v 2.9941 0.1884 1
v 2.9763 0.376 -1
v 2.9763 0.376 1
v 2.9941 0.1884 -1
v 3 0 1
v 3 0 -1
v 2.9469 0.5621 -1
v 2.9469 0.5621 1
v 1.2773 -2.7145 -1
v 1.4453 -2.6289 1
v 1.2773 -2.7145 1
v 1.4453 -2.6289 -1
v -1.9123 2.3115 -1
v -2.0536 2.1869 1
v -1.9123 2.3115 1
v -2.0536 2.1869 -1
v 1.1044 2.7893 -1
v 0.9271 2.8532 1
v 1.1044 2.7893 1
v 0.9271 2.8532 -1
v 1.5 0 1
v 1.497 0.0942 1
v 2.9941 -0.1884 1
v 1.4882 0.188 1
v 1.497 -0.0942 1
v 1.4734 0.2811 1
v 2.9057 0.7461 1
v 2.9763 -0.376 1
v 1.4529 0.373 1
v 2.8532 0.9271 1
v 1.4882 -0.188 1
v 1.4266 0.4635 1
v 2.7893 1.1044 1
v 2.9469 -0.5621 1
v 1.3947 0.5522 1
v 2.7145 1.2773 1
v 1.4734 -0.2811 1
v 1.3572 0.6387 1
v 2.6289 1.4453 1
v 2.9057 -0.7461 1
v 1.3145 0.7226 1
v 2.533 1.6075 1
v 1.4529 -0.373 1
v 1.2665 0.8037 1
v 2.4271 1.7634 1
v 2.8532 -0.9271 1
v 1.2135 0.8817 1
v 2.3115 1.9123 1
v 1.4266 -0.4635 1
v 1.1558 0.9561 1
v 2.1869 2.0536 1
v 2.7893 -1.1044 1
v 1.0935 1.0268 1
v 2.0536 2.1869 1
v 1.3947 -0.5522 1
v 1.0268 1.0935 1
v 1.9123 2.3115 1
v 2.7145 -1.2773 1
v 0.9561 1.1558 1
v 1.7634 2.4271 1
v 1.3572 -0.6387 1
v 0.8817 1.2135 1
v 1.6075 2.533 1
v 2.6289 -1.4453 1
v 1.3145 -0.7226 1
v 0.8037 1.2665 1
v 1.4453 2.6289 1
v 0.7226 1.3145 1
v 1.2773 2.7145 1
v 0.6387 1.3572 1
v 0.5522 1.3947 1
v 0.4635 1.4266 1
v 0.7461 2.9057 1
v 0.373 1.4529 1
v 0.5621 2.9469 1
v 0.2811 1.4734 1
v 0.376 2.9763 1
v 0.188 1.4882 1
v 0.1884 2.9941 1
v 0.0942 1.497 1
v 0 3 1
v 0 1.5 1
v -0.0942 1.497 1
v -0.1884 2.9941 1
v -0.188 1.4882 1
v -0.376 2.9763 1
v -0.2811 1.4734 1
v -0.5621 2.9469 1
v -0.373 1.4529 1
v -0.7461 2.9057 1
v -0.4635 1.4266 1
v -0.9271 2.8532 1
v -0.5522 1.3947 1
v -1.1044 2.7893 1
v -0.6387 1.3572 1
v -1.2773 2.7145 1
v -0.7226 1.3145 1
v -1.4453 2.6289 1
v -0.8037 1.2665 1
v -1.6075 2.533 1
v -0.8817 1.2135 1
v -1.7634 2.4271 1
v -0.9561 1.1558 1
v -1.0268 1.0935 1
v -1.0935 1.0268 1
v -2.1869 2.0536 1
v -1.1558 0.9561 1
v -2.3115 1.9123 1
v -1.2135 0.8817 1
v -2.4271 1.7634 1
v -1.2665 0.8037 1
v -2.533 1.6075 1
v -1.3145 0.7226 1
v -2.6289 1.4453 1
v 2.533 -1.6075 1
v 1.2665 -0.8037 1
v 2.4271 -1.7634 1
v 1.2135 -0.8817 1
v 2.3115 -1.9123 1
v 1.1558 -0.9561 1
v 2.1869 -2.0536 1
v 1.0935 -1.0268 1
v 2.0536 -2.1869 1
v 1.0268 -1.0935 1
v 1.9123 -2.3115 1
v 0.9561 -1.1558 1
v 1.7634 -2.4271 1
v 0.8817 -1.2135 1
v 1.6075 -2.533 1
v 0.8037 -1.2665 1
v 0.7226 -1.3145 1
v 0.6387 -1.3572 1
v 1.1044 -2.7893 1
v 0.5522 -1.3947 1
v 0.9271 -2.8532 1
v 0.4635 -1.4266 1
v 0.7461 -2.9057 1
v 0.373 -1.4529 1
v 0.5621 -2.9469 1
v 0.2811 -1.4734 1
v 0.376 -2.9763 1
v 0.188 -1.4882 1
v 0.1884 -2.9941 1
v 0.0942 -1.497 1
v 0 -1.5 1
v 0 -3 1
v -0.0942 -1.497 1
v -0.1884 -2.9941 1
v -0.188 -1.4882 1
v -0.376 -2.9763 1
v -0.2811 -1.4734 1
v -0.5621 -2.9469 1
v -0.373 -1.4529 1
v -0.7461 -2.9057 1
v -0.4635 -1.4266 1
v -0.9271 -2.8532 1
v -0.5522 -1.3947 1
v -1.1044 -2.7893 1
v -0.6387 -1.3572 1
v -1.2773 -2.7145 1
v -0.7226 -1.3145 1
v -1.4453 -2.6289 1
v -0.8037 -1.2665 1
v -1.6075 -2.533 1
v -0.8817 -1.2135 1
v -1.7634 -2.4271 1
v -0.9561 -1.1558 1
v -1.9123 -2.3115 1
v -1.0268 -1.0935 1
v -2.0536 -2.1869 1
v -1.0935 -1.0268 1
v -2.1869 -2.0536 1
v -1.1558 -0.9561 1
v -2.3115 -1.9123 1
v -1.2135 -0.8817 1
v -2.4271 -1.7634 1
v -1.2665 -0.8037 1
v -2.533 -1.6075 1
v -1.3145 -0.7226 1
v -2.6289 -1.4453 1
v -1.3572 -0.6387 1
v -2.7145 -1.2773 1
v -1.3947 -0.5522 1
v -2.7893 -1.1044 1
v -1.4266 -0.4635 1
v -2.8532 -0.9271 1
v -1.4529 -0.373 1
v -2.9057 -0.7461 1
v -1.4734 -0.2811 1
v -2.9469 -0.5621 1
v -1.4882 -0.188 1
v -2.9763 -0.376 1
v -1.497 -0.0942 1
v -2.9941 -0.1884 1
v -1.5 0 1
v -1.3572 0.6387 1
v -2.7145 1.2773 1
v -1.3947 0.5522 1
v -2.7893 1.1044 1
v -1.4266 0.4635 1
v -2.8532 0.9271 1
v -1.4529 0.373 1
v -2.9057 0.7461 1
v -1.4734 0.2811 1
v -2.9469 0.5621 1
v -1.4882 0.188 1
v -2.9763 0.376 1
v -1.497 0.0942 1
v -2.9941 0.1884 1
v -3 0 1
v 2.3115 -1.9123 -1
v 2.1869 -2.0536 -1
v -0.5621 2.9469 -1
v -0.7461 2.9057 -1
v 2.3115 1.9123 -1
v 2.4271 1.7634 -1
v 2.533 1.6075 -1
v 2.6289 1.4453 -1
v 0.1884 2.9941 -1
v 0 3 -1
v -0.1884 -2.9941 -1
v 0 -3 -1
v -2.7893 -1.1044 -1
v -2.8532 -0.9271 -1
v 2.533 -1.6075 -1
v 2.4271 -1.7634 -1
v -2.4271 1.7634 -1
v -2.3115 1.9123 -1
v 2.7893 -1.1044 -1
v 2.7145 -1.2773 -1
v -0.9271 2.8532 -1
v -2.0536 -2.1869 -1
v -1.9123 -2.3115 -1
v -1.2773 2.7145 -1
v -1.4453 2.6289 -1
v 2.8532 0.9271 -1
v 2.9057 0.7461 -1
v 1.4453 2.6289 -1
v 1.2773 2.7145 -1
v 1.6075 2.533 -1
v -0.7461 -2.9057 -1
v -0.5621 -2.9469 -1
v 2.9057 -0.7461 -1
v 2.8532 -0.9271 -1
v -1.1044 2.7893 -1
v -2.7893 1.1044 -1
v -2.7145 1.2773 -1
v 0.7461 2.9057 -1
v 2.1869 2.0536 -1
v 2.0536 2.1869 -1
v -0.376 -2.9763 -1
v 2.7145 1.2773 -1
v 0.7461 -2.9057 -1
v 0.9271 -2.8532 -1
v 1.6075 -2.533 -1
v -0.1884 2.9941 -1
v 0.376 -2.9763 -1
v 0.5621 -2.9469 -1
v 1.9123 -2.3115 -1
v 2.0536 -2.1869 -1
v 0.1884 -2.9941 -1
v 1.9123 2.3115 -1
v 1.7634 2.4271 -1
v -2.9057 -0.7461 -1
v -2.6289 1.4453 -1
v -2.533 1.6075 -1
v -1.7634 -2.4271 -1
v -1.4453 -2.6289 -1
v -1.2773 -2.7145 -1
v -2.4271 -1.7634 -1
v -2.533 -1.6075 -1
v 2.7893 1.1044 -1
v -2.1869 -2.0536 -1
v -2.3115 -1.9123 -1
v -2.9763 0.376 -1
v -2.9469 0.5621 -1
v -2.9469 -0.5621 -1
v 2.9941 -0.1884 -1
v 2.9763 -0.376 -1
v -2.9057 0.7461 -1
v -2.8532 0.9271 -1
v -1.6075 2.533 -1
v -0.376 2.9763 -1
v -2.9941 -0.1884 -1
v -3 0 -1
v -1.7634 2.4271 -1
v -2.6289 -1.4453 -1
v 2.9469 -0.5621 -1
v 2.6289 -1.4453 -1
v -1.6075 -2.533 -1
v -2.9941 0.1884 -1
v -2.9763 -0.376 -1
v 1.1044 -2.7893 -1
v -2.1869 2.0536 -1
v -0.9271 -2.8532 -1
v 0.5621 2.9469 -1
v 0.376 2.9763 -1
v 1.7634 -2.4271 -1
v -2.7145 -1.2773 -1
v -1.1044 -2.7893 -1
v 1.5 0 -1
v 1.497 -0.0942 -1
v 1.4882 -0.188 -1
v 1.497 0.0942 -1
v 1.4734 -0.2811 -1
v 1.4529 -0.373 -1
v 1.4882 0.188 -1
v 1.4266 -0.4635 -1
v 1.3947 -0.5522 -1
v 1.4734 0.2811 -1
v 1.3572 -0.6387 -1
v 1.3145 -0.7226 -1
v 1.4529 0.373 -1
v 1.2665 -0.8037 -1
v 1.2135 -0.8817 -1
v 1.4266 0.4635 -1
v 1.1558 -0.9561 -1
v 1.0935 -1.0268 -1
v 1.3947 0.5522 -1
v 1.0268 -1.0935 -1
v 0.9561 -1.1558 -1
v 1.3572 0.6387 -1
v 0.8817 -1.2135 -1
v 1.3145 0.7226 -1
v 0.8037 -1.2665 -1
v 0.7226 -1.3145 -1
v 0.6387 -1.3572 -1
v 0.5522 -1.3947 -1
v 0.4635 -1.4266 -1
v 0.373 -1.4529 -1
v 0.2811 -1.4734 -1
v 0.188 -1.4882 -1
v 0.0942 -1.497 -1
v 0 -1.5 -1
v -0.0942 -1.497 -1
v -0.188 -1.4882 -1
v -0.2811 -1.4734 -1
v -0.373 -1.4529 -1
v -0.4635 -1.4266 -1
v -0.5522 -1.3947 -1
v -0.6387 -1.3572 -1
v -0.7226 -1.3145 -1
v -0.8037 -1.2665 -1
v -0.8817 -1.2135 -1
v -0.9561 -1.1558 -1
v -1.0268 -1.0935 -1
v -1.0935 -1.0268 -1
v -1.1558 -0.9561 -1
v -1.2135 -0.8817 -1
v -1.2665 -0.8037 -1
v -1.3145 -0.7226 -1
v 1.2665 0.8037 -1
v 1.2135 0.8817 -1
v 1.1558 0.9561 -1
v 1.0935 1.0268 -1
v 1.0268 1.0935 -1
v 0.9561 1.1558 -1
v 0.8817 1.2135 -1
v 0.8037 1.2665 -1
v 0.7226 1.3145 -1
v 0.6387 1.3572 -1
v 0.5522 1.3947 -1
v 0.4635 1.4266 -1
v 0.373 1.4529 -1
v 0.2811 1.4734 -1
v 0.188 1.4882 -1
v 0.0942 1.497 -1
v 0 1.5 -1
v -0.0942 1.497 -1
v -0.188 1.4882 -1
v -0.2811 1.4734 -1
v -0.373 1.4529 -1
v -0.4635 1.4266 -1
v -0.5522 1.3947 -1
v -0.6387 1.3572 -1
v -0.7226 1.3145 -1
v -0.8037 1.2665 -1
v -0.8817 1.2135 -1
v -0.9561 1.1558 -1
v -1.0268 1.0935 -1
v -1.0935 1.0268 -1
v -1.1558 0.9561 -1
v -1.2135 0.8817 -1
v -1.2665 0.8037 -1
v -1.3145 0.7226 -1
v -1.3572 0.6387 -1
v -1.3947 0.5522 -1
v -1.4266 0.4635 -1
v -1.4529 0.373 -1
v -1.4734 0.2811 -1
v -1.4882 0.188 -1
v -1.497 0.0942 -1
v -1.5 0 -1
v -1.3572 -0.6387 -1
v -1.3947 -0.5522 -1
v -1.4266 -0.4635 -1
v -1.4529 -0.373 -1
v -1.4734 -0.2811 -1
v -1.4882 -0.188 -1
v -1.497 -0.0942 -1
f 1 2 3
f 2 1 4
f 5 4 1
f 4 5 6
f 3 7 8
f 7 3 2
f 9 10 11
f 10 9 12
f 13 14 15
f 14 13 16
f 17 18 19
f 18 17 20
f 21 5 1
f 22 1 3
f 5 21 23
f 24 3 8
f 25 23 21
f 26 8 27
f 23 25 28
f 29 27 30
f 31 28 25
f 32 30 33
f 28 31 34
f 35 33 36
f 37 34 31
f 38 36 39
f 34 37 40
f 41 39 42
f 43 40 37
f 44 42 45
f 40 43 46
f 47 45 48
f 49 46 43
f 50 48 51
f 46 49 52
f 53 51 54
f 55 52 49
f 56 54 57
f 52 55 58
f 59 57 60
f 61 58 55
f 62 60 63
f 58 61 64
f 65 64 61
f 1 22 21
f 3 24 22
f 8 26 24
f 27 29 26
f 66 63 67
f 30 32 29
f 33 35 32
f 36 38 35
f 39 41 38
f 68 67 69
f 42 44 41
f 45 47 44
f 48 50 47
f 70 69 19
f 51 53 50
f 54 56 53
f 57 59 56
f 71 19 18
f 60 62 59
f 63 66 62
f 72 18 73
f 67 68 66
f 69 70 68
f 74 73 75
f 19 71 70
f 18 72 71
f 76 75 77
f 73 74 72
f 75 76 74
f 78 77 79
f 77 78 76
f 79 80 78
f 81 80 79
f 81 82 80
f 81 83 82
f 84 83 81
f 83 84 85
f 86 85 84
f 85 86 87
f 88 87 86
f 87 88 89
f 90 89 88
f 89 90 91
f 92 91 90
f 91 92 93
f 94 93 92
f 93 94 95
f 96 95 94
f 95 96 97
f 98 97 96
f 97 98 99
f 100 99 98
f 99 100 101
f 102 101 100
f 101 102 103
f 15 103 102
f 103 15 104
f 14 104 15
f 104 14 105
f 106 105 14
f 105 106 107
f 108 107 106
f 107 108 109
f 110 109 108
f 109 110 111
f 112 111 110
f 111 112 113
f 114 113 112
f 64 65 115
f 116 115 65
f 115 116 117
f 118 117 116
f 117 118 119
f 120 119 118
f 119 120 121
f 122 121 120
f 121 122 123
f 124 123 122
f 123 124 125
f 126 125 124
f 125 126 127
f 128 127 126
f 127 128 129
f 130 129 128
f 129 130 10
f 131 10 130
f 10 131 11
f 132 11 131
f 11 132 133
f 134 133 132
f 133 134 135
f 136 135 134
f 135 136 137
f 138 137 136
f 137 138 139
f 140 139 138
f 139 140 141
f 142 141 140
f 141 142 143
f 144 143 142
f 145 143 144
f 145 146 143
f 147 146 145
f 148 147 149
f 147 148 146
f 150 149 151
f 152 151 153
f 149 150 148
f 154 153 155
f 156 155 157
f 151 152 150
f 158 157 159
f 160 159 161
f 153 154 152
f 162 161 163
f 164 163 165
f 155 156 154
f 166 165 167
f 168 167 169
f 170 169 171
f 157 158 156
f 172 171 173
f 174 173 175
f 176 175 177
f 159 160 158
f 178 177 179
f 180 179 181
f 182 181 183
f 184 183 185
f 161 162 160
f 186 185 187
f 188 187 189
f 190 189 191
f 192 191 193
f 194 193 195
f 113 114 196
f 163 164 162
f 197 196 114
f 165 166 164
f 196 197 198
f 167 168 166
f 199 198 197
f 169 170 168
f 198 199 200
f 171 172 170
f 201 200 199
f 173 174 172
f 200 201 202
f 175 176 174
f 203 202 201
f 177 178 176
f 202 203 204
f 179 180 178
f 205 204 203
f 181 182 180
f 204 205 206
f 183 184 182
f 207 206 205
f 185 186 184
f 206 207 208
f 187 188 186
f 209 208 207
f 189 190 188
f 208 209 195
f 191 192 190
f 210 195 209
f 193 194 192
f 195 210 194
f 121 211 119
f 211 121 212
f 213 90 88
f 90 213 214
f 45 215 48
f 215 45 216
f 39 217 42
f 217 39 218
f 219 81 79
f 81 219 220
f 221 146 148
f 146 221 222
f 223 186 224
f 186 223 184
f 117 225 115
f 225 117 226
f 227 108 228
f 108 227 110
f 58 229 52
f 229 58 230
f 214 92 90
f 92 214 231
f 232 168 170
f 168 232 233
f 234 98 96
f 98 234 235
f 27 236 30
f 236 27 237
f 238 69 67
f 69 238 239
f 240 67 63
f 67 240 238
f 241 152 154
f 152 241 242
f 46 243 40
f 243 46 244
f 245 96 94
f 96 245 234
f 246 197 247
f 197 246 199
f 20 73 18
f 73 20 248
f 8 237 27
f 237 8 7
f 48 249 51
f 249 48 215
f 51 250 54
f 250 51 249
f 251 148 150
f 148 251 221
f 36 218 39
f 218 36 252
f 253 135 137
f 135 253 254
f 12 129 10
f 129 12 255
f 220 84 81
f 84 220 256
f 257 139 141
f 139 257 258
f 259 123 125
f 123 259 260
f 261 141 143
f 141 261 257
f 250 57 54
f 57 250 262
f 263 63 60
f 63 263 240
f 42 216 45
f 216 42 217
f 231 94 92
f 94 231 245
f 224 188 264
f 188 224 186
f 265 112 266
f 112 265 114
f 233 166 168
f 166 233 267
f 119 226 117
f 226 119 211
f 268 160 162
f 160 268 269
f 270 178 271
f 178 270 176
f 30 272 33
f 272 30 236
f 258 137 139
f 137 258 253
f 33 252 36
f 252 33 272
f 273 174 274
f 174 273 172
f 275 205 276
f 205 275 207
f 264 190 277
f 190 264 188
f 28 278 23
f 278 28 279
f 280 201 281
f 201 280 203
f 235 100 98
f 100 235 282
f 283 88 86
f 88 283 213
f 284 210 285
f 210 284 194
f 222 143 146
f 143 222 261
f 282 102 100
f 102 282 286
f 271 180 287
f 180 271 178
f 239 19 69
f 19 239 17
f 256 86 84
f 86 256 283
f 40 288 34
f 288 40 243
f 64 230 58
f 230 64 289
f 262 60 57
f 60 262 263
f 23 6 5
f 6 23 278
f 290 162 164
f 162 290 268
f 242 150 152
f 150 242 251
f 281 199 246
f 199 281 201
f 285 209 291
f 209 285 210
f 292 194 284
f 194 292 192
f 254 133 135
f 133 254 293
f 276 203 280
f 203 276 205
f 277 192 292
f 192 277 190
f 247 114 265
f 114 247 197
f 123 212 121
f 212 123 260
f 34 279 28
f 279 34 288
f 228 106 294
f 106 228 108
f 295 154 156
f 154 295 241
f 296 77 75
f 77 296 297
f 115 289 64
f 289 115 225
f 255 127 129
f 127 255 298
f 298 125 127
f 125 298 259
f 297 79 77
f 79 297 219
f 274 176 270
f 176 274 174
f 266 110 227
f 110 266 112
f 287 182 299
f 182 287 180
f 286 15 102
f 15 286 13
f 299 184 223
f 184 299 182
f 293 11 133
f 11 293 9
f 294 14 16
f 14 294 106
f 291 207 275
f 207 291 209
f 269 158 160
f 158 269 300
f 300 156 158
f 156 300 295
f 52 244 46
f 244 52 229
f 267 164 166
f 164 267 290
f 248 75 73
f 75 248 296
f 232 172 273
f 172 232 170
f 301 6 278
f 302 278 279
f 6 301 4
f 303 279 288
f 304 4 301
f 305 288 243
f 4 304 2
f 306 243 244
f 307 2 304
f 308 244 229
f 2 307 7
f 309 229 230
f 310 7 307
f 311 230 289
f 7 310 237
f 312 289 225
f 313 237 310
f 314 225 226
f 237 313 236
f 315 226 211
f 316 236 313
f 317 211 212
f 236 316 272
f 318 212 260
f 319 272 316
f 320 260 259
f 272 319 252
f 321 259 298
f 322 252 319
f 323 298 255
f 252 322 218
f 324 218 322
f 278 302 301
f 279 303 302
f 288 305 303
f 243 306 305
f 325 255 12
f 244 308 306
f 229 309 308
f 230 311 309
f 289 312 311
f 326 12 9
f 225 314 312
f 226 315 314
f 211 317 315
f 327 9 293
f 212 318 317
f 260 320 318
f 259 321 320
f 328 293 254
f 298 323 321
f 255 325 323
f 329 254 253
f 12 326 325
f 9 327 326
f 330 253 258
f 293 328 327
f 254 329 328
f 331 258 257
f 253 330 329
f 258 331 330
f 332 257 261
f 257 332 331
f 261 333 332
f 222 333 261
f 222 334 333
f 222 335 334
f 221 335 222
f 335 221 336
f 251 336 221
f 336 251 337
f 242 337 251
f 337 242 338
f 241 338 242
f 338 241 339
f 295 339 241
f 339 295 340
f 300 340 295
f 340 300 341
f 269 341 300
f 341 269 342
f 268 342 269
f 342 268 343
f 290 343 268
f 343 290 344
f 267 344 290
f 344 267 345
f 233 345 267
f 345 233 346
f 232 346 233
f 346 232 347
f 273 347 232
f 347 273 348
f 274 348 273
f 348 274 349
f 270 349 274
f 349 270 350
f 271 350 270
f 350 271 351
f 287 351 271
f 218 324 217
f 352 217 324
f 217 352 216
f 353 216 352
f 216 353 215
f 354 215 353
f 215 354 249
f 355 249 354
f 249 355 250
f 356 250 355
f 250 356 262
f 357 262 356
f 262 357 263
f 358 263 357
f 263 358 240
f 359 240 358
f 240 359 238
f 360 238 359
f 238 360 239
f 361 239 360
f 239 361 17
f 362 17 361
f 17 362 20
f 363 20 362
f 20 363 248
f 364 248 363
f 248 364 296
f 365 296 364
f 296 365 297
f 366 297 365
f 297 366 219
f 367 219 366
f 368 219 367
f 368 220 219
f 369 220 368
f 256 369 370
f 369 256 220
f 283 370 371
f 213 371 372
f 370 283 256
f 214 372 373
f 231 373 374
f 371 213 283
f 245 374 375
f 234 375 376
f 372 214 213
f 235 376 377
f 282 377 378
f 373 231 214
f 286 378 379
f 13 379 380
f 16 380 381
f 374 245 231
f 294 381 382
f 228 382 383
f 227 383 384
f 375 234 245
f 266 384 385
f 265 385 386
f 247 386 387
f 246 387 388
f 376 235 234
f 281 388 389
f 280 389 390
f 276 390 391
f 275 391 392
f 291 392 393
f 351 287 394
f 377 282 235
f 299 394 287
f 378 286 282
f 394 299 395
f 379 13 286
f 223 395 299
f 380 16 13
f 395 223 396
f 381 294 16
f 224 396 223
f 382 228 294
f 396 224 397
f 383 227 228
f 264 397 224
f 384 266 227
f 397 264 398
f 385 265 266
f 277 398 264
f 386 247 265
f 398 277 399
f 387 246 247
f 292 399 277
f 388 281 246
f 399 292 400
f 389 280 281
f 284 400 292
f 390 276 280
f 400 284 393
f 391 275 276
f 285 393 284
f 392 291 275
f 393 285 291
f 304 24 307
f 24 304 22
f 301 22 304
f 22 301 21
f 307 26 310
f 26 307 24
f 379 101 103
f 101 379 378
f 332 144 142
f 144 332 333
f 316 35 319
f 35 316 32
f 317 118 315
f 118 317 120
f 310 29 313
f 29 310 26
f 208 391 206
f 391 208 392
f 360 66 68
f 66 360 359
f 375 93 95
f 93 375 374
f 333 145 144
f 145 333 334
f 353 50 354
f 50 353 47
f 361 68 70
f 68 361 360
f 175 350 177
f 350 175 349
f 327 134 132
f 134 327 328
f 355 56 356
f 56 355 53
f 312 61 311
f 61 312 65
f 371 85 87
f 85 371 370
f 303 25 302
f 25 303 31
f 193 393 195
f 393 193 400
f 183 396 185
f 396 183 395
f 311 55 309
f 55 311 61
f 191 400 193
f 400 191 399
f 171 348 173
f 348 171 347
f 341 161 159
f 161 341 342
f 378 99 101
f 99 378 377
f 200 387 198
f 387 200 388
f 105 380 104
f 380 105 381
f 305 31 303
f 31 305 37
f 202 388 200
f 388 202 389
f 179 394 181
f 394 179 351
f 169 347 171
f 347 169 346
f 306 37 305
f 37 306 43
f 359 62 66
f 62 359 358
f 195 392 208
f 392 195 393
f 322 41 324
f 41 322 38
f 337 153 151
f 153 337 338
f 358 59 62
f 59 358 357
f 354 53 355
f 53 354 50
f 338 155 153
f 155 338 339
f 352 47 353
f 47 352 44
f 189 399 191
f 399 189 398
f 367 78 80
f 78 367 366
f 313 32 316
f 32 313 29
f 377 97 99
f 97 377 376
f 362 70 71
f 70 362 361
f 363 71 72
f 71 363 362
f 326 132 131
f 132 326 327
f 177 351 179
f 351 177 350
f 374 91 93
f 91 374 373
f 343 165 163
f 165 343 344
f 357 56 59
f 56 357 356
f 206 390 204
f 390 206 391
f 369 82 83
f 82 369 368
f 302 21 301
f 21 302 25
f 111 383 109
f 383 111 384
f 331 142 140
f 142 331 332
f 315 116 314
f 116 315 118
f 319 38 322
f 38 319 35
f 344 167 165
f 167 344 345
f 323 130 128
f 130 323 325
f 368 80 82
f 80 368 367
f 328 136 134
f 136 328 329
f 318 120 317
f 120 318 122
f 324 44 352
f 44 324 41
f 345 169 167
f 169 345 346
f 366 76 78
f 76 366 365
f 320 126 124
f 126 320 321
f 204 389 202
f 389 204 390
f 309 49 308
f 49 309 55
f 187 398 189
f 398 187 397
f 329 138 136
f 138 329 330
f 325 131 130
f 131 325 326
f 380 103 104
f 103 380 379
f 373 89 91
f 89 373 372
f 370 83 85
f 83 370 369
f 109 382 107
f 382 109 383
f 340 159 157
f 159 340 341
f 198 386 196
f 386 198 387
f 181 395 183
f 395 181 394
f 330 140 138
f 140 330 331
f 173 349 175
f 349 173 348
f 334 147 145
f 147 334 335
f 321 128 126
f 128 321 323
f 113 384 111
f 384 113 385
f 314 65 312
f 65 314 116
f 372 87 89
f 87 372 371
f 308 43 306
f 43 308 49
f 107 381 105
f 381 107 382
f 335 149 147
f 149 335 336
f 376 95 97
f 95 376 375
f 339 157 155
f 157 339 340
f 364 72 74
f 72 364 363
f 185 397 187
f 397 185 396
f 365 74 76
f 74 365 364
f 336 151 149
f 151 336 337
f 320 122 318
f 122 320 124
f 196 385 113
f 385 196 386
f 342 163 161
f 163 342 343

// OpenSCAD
$fn=100;
difference() {
    cylinder(h=2, r=3, center = true);
    cylinder(h=5, r=1.5, center = true);
}
